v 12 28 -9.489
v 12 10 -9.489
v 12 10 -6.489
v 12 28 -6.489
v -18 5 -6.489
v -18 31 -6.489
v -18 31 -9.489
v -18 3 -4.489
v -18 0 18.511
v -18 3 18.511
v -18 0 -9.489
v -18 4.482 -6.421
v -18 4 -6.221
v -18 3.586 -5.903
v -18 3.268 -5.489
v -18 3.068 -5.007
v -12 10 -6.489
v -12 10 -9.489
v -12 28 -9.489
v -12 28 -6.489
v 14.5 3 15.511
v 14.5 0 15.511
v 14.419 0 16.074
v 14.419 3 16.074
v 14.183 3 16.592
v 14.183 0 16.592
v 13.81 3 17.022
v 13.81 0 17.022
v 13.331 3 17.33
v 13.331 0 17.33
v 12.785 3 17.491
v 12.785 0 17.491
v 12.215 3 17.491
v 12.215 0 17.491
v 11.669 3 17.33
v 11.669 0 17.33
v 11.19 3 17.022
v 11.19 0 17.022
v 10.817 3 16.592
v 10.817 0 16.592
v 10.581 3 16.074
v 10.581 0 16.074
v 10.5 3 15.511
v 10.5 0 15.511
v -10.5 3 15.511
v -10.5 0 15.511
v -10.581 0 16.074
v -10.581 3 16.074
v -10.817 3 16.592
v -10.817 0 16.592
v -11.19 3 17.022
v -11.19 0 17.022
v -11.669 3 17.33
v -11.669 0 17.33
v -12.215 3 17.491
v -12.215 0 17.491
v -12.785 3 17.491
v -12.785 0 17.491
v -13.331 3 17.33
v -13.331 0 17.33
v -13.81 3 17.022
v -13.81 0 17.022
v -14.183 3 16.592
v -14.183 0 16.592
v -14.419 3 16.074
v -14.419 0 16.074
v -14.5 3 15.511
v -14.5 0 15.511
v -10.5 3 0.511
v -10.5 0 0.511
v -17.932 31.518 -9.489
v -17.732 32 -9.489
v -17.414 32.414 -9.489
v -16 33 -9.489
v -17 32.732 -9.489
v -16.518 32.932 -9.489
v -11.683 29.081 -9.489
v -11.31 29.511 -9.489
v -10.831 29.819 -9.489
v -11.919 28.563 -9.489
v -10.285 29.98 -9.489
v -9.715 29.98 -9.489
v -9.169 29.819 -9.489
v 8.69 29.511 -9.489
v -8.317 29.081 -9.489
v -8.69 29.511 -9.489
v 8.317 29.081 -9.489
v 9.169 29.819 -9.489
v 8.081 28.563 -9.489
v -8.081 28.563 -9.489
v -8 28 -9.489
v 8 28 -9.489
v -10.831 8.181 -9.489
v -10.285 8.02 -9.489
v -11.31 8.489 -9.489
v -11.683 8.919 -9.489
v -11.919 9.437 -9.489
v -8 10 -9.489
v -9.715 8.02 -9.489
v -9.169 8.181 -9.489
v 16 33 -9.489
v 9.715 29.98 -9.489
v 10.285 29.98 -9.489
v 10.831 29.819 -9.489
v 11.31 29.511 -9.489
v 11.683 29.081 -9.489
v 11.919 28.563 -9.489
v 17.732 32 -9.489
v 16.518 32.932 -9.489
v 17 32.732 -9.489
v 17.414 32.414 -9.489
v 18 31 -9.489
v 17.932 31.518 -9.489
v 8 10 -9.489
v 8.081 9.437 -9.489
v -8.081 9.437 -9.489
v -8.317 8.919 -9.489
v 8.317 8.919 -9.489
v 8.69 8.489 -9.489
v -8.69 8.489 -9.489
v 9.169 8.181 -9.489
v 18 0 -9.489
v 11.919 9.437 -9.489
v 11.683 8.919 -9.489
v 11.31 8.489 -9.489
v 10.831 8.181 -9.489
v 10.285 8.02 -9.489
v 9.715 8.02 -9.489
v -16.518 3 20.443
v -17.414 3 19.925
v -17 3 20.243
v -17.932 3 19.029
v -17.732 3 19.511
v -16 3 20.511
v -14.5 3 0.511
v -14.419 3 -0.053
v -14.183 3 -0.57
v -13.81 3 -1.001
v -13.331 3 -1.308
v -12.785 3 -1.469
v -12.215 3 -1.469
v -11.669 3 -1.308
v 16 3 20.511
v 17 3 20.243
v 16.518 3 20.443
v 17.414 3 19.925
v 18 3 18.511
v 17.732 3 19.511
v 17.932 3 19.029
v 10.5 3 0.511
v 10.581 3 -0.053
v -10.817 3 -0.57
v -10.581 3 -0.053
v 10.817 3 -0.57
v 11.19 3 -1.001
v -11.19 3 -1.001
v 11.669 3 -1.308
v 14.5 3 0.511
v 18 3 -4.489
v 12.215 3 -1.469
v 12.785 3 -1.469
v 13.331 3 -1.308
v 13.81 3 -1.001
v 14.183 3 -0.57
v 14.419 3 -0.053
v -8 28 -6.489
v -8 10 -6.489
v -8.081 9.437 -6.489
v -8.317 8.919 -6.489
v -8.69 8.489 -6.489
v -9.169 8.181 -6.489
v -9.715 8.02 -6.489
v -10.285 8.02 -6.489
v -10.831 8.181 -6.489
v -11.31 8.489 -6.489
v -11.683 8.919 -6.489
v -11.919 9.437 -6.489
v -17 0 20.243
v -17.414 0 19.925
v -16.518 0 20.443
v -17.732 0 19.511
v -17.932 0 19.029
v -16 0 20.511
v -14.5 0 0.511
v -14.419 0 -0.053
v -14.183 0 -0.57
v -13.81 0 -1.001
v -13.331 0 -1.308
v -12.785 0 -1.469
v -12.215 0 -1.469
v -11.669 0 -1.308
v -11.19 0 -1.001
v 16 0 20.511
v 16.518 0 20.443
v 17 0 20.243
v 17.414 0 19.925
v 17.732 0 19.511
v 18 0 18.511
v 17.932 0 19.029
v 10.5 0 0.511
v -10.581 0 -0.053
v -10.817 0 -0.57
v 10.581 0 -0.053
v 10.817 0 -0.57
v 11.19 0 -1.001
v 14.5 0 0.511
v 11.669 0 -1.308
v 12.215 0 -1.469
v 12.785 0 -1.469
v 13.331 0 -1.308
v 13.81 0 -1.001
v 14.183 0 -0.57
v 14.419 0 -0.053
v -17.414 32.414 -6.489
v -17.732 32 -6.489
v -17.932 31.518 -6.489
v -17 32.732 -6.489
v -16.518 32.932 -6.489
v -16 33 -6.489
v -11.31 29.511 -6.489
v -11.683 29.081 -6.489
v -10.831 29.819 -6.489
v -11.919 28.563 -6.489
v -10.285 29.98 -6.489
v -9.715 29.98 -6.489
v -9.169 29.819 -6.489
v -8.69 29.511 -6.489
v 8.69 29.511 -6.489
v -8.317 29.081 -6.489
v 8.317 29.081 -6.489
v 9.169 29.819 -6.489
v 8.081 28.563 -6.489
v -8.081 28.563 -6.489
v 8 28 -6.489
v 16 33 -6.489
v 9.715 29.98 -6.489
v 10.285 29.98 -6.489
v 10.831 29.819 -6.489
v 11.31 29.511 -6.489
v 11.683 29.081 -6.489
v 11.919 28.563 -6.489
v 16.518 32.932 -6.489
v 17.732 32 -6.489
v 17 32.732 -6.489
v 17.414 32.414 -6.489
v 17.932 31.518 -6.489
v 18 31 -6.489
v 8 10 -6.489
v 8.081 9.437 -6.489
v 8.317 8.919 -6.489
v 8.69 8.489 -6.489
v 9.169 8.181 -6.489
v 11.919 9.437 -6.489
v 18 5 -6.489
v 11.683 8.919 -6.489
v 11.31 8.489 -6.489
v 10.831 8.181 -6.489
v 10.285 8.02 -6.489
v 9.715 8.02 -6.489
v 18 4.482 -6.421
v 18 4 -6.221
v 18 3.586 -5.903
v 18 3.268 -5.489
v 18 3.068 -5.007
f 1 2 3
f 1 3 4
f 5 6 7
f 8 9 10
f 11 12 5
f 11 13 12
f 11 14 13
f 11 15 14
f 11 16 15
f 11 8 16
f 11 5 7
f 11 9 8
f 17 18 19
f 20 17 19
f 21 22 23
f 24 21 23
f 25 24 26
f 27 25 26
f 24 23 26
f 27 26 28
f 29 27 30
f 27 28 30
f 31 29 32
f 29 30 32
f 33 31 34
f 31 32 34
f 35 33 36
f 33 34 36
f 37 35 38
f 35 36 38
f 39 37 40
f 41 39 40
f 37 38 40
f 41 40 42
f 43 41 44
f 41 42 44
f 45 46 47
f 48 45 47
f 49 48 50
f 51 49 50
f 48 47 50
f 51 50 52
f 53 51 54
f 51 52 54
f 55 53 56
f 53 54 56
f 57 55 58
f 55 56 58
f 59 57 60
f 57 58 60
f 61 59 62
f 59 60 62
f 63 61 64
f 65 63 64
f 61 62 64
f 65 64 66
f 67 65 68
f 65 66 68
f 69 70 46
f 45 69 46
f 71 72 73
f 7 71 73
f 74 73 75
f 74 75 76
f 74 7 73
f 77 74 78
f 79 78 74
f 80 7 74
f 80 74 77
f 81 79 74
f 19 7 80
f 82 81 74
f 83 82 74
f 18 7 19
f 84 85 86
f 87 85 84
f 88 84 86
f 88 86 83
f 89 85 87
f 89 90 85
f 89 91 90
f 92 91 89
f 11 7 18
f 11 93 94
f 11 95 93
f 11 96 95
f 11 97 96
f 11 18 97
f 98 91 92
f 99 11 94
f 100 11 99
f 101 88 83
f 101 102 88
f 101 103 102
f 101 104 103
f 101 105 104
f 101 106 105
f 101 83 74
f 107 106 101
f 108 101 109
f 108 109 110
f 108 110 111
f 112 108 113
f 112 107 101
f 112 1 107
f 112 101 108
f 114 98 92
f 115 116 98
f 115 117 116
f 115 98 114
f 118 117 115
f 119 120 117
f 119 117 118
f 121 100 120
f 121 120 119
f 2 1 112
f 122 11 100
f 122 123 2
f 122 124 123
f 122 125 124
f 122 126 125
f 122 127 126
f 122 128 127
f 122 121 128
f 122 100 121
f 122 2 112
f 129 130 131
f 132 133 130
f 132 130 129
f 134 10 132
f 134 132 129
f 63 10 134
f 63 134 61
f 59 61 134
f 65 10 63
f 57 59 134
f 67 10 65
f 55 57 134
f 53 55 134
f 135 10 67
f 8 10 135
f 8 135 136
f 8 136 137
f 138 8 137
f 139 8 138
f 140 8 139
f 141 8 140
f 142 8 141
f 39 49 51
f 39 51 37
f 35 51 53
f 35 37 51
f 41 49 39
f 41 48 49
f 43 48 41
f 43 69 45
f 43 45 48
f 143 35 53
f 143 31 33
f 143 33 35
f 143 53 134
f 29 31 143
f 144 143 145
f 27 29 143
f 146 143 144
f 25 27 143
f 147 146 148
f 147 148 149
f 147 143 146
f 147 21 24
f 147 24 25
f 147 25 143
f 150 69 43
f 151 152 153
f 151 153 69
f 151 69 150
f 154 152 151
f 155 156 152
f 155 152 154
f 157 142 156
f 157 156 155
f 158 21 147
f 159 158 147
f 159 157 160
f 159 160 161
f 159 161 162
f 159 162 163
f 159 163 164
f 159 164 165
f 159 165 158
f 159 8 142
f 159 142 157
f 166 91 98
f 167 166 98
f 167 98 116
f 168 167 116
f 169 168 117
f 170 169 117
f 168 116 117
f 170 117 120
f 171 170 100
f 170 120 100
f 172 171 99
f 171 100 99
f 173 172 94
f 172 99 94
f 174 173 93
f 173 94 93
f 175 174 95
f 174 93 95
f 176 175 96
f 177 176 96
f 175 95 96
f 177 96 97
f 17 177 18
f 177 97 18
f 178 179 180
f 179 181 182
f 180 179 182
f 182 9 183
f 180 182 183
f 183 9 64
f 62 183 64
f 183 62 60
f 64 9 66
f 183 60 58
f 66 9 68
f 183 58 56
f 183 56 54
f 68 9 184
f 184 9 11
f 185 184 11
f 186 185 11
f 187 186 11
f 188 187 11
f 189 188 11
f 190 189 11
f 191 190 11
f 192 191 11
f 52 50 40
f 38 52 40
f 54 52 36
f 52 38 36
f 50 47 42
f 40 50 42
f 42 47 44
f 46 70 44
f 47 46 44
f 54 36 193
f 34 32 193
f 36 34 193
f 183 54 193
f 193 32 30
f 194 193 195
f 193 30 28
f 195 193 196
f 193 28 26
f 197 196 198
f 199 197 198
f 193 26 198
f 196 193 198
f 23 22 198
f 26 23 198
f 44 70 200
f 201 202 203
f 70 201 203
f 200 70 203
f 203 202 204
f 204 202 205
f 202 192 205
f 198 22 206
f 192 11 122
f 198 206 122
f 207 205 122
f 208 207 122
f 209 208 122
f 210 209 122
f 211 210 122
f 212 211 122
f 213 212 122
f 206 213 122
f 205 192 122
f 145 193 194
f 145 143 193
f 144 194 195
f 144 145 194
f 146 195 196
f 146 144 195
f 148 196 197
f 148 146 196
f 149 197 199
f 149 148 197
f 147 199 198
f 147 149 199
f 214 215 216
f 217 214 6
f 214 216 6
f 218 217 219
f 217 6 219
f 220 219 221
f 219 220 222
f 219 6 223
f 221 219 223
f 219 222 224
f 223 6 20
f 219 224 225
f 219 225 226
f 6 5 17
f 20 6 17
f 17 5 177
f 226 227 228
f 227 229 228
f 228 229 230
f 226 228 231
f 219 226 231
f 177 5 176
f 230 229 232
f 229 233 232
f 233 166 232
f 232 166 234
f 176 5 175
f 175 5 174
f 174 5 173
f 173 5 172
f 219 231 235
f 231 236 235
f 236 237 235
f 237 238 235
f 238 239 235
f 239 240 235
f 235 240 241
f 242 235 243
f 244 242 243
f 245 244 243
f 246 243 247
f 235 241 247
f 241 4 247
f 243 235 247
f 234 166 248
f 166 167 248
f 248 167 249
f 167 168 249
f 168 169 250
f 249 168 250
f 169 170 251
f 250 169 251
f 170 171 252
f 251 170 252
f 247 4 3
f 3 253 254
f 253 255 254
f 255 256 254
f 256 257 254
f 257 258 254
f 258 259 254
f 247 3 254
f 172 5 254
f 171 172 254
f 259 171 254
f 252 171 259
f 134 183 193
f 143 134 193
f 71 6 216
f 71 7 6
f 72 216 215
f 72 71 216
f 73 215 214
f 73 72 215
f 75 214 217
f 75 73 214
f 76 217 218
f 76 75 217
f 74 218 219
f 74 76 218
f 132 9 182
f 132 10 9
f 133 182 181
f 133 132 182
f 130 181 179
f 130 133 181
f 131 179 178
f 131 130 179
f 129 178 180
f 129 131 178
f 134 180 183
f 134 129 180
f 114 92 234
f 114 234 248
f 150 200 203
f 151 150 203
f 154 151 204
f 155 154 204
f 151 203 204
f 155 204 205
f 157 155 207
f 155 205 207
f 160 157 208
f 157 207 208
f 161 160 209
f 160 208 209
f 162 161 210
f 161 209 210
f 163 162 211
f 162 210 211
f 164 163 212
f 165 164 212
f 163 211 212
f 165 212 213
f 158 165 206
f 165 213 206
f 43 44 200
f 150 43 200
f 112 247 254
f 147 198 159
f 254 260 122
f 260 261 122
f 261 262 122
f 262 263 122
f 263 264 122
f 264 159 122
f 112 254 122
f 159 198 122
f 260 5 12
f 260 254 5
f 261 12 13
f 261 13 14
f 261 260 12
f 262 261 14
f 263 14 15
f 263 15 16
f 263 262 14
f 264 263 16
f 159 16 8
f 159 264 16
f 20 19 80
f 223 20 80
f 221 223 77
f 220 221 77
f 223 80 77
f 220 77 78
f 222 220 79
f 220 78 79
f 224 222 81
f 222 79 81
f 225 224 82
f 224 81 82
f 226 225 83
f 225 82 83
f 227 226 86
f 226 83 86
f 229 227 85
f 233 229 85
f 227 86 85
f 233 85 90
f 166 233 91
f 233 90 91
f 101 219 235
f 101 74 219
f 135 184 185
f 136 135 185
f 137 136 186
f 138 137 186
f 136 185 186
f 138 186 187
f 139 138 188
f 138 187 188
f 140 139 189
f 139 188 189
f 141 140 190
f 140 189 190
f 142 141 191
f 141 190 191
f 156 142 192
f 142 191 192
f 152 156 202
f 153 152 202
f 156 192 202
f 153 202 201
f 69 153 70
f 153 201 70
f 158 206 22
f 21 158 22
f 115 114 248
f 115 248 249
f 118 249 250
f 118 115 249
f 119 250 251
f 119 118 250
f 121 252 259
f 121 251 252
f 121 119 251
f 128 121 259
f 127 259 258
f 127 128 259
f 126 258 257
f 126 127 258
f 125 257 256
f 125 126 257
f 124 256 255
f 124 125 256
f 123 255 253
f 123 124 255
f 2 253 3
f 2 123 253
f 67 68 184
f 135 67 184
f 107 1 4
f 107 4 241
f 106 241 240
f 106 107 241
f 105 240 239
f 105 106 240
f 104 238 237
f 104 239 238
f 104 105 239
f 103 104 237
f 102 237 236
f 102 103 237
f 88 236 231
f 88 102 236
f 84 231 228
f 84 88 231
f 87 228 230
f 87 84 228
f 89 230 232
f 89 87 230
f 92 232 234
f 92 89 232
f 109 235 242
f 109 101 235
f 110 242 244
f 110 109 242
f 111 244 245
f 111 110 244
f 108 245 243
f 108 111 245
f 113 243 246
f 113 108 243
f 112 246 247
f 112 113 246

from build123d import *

# Parameters (mm, degrees)
EXTRUDE_1_DEPTH          = 3
SKETCH_2_W               = 36
SKETCH_2_H               = 3
EXTRUDE_2_DEPTH          = 30
CUT_EXTRUDE_1_DEPTH      = 47.281745862
CUT_EXTRUDE_1_DEPTH_BACK = 47.281745862
FILLET_1_R               = 2
FILLET_2_R               = 2


with BuildPart() as part:
    # 草图1 → 凸台-拉伸1 (new body)
    with BuildSketch(Plane(origin=(0, 0, 0), x_dir=(1, 0, 0), z_dir=(0, 1, 0))):
        Polygon((0, 9.489130435), (-18, 9.489130435), (-18, -20.510869565), (0, -20.510869565), (18, -20.510869565), (18, 9.489130435), align=None)
        with BuildLine():
            Line((-10.5, -0.510869565), (-10.5, -15.510869565))
            ThreePointArc((-10.5, -15.510869565), (-12.5, -17.510869565), (-14.5, -15.510869565))
            Line((-14.5, -15.510869565), (-14.5, -0.510869565))
            ThreePointArc((-14.5, -0.510869565), (-12.5, 1.489130435), (-10.5, -0.510869565))
        make_face(mode=Mode.SUBTRACT)
        with BuildLine():
            Line((14.5, -0.510869565), (14.5, -15.510869565))
            ThreePointArc((14.5, -15.510869565), (12.5, -17.510869565), (10.5, -15.510869565))
            Line((10.5, -15.510869565), (10.5, -0.510869565))
            ThreePointArc((10.5, -0.510869565), (12.5, 1.489130435), (14.5, -0.510869565))
        make_face(mode=Mode.SUBTRACT)
    extrude(amount=EXTRUDE_1_DEPTH)

    # 草图2 → 凸台-拉伸2 (add)
    with BuildSketch(Plane(origin=(0, 3, 0), x_dir=(1, 0, 0), z_dir=(0, 1, 0))):
        with Locations((0, 7.989130435)):
            Rectangle(SKETCH_2_W, SKETCH_2_H)
    extrude(amount=EXTRUDE_2_DEPTH)

    # 草图3 → 切除-拉伸1 (cut, two sides: drawn at the far end of the back side and taken through both)
    with BuildSketch(Plane.XY.offset(-6.489130435).offset(-CUT_EXTRUDE_1_DEPTH_BACK)):
        with BuildLine():
            Line((-8, 28), (-8, 10))
            ThreePointArc((-8, 10), (-10, 8), (-12, 10))
            Line((-12, 10), (-12, 28))
            ThreePointArc((-12, 28), (-10, 30), (-8, 28))
        make_face()
        with BuildLine():
            Line((8, 28), (8, 10))
            ThreePointArc((8, 10), (10, 8), (12, 10))
            Line((12, 10), (12, 28))
            ThreePointArc((12, 28), (10, 30), (8, 28))
        make_face()
    extrude(amount=CUT_EXTRUDE_1_DEPTH + CUT_EXTRUDE_1_DEPTH_BACK, mode=Mode.SUBTRACT)

    # 圆角1
    fillet_1_edges = [part.edges().sort_by_distance(p)[0] for p in [
        (18, 1.5, 20.510869565),
        (-18, 1.5, 20.510869565),
        (-18, 33, -7.989130435),
        (18, 33, -7.989130435),
    ]]
    fillet(fillet_1_edges, radius=FILLET_1_R)

    # 圆角2
    fillet_2_edges = [part.edges().sort_by_distance(p)[0] for p in [
        (0, 3, -6.489130435),
    ]]
    fillet(fillet_2_edges, radius=FILLET_2_R)


solid = part.part
